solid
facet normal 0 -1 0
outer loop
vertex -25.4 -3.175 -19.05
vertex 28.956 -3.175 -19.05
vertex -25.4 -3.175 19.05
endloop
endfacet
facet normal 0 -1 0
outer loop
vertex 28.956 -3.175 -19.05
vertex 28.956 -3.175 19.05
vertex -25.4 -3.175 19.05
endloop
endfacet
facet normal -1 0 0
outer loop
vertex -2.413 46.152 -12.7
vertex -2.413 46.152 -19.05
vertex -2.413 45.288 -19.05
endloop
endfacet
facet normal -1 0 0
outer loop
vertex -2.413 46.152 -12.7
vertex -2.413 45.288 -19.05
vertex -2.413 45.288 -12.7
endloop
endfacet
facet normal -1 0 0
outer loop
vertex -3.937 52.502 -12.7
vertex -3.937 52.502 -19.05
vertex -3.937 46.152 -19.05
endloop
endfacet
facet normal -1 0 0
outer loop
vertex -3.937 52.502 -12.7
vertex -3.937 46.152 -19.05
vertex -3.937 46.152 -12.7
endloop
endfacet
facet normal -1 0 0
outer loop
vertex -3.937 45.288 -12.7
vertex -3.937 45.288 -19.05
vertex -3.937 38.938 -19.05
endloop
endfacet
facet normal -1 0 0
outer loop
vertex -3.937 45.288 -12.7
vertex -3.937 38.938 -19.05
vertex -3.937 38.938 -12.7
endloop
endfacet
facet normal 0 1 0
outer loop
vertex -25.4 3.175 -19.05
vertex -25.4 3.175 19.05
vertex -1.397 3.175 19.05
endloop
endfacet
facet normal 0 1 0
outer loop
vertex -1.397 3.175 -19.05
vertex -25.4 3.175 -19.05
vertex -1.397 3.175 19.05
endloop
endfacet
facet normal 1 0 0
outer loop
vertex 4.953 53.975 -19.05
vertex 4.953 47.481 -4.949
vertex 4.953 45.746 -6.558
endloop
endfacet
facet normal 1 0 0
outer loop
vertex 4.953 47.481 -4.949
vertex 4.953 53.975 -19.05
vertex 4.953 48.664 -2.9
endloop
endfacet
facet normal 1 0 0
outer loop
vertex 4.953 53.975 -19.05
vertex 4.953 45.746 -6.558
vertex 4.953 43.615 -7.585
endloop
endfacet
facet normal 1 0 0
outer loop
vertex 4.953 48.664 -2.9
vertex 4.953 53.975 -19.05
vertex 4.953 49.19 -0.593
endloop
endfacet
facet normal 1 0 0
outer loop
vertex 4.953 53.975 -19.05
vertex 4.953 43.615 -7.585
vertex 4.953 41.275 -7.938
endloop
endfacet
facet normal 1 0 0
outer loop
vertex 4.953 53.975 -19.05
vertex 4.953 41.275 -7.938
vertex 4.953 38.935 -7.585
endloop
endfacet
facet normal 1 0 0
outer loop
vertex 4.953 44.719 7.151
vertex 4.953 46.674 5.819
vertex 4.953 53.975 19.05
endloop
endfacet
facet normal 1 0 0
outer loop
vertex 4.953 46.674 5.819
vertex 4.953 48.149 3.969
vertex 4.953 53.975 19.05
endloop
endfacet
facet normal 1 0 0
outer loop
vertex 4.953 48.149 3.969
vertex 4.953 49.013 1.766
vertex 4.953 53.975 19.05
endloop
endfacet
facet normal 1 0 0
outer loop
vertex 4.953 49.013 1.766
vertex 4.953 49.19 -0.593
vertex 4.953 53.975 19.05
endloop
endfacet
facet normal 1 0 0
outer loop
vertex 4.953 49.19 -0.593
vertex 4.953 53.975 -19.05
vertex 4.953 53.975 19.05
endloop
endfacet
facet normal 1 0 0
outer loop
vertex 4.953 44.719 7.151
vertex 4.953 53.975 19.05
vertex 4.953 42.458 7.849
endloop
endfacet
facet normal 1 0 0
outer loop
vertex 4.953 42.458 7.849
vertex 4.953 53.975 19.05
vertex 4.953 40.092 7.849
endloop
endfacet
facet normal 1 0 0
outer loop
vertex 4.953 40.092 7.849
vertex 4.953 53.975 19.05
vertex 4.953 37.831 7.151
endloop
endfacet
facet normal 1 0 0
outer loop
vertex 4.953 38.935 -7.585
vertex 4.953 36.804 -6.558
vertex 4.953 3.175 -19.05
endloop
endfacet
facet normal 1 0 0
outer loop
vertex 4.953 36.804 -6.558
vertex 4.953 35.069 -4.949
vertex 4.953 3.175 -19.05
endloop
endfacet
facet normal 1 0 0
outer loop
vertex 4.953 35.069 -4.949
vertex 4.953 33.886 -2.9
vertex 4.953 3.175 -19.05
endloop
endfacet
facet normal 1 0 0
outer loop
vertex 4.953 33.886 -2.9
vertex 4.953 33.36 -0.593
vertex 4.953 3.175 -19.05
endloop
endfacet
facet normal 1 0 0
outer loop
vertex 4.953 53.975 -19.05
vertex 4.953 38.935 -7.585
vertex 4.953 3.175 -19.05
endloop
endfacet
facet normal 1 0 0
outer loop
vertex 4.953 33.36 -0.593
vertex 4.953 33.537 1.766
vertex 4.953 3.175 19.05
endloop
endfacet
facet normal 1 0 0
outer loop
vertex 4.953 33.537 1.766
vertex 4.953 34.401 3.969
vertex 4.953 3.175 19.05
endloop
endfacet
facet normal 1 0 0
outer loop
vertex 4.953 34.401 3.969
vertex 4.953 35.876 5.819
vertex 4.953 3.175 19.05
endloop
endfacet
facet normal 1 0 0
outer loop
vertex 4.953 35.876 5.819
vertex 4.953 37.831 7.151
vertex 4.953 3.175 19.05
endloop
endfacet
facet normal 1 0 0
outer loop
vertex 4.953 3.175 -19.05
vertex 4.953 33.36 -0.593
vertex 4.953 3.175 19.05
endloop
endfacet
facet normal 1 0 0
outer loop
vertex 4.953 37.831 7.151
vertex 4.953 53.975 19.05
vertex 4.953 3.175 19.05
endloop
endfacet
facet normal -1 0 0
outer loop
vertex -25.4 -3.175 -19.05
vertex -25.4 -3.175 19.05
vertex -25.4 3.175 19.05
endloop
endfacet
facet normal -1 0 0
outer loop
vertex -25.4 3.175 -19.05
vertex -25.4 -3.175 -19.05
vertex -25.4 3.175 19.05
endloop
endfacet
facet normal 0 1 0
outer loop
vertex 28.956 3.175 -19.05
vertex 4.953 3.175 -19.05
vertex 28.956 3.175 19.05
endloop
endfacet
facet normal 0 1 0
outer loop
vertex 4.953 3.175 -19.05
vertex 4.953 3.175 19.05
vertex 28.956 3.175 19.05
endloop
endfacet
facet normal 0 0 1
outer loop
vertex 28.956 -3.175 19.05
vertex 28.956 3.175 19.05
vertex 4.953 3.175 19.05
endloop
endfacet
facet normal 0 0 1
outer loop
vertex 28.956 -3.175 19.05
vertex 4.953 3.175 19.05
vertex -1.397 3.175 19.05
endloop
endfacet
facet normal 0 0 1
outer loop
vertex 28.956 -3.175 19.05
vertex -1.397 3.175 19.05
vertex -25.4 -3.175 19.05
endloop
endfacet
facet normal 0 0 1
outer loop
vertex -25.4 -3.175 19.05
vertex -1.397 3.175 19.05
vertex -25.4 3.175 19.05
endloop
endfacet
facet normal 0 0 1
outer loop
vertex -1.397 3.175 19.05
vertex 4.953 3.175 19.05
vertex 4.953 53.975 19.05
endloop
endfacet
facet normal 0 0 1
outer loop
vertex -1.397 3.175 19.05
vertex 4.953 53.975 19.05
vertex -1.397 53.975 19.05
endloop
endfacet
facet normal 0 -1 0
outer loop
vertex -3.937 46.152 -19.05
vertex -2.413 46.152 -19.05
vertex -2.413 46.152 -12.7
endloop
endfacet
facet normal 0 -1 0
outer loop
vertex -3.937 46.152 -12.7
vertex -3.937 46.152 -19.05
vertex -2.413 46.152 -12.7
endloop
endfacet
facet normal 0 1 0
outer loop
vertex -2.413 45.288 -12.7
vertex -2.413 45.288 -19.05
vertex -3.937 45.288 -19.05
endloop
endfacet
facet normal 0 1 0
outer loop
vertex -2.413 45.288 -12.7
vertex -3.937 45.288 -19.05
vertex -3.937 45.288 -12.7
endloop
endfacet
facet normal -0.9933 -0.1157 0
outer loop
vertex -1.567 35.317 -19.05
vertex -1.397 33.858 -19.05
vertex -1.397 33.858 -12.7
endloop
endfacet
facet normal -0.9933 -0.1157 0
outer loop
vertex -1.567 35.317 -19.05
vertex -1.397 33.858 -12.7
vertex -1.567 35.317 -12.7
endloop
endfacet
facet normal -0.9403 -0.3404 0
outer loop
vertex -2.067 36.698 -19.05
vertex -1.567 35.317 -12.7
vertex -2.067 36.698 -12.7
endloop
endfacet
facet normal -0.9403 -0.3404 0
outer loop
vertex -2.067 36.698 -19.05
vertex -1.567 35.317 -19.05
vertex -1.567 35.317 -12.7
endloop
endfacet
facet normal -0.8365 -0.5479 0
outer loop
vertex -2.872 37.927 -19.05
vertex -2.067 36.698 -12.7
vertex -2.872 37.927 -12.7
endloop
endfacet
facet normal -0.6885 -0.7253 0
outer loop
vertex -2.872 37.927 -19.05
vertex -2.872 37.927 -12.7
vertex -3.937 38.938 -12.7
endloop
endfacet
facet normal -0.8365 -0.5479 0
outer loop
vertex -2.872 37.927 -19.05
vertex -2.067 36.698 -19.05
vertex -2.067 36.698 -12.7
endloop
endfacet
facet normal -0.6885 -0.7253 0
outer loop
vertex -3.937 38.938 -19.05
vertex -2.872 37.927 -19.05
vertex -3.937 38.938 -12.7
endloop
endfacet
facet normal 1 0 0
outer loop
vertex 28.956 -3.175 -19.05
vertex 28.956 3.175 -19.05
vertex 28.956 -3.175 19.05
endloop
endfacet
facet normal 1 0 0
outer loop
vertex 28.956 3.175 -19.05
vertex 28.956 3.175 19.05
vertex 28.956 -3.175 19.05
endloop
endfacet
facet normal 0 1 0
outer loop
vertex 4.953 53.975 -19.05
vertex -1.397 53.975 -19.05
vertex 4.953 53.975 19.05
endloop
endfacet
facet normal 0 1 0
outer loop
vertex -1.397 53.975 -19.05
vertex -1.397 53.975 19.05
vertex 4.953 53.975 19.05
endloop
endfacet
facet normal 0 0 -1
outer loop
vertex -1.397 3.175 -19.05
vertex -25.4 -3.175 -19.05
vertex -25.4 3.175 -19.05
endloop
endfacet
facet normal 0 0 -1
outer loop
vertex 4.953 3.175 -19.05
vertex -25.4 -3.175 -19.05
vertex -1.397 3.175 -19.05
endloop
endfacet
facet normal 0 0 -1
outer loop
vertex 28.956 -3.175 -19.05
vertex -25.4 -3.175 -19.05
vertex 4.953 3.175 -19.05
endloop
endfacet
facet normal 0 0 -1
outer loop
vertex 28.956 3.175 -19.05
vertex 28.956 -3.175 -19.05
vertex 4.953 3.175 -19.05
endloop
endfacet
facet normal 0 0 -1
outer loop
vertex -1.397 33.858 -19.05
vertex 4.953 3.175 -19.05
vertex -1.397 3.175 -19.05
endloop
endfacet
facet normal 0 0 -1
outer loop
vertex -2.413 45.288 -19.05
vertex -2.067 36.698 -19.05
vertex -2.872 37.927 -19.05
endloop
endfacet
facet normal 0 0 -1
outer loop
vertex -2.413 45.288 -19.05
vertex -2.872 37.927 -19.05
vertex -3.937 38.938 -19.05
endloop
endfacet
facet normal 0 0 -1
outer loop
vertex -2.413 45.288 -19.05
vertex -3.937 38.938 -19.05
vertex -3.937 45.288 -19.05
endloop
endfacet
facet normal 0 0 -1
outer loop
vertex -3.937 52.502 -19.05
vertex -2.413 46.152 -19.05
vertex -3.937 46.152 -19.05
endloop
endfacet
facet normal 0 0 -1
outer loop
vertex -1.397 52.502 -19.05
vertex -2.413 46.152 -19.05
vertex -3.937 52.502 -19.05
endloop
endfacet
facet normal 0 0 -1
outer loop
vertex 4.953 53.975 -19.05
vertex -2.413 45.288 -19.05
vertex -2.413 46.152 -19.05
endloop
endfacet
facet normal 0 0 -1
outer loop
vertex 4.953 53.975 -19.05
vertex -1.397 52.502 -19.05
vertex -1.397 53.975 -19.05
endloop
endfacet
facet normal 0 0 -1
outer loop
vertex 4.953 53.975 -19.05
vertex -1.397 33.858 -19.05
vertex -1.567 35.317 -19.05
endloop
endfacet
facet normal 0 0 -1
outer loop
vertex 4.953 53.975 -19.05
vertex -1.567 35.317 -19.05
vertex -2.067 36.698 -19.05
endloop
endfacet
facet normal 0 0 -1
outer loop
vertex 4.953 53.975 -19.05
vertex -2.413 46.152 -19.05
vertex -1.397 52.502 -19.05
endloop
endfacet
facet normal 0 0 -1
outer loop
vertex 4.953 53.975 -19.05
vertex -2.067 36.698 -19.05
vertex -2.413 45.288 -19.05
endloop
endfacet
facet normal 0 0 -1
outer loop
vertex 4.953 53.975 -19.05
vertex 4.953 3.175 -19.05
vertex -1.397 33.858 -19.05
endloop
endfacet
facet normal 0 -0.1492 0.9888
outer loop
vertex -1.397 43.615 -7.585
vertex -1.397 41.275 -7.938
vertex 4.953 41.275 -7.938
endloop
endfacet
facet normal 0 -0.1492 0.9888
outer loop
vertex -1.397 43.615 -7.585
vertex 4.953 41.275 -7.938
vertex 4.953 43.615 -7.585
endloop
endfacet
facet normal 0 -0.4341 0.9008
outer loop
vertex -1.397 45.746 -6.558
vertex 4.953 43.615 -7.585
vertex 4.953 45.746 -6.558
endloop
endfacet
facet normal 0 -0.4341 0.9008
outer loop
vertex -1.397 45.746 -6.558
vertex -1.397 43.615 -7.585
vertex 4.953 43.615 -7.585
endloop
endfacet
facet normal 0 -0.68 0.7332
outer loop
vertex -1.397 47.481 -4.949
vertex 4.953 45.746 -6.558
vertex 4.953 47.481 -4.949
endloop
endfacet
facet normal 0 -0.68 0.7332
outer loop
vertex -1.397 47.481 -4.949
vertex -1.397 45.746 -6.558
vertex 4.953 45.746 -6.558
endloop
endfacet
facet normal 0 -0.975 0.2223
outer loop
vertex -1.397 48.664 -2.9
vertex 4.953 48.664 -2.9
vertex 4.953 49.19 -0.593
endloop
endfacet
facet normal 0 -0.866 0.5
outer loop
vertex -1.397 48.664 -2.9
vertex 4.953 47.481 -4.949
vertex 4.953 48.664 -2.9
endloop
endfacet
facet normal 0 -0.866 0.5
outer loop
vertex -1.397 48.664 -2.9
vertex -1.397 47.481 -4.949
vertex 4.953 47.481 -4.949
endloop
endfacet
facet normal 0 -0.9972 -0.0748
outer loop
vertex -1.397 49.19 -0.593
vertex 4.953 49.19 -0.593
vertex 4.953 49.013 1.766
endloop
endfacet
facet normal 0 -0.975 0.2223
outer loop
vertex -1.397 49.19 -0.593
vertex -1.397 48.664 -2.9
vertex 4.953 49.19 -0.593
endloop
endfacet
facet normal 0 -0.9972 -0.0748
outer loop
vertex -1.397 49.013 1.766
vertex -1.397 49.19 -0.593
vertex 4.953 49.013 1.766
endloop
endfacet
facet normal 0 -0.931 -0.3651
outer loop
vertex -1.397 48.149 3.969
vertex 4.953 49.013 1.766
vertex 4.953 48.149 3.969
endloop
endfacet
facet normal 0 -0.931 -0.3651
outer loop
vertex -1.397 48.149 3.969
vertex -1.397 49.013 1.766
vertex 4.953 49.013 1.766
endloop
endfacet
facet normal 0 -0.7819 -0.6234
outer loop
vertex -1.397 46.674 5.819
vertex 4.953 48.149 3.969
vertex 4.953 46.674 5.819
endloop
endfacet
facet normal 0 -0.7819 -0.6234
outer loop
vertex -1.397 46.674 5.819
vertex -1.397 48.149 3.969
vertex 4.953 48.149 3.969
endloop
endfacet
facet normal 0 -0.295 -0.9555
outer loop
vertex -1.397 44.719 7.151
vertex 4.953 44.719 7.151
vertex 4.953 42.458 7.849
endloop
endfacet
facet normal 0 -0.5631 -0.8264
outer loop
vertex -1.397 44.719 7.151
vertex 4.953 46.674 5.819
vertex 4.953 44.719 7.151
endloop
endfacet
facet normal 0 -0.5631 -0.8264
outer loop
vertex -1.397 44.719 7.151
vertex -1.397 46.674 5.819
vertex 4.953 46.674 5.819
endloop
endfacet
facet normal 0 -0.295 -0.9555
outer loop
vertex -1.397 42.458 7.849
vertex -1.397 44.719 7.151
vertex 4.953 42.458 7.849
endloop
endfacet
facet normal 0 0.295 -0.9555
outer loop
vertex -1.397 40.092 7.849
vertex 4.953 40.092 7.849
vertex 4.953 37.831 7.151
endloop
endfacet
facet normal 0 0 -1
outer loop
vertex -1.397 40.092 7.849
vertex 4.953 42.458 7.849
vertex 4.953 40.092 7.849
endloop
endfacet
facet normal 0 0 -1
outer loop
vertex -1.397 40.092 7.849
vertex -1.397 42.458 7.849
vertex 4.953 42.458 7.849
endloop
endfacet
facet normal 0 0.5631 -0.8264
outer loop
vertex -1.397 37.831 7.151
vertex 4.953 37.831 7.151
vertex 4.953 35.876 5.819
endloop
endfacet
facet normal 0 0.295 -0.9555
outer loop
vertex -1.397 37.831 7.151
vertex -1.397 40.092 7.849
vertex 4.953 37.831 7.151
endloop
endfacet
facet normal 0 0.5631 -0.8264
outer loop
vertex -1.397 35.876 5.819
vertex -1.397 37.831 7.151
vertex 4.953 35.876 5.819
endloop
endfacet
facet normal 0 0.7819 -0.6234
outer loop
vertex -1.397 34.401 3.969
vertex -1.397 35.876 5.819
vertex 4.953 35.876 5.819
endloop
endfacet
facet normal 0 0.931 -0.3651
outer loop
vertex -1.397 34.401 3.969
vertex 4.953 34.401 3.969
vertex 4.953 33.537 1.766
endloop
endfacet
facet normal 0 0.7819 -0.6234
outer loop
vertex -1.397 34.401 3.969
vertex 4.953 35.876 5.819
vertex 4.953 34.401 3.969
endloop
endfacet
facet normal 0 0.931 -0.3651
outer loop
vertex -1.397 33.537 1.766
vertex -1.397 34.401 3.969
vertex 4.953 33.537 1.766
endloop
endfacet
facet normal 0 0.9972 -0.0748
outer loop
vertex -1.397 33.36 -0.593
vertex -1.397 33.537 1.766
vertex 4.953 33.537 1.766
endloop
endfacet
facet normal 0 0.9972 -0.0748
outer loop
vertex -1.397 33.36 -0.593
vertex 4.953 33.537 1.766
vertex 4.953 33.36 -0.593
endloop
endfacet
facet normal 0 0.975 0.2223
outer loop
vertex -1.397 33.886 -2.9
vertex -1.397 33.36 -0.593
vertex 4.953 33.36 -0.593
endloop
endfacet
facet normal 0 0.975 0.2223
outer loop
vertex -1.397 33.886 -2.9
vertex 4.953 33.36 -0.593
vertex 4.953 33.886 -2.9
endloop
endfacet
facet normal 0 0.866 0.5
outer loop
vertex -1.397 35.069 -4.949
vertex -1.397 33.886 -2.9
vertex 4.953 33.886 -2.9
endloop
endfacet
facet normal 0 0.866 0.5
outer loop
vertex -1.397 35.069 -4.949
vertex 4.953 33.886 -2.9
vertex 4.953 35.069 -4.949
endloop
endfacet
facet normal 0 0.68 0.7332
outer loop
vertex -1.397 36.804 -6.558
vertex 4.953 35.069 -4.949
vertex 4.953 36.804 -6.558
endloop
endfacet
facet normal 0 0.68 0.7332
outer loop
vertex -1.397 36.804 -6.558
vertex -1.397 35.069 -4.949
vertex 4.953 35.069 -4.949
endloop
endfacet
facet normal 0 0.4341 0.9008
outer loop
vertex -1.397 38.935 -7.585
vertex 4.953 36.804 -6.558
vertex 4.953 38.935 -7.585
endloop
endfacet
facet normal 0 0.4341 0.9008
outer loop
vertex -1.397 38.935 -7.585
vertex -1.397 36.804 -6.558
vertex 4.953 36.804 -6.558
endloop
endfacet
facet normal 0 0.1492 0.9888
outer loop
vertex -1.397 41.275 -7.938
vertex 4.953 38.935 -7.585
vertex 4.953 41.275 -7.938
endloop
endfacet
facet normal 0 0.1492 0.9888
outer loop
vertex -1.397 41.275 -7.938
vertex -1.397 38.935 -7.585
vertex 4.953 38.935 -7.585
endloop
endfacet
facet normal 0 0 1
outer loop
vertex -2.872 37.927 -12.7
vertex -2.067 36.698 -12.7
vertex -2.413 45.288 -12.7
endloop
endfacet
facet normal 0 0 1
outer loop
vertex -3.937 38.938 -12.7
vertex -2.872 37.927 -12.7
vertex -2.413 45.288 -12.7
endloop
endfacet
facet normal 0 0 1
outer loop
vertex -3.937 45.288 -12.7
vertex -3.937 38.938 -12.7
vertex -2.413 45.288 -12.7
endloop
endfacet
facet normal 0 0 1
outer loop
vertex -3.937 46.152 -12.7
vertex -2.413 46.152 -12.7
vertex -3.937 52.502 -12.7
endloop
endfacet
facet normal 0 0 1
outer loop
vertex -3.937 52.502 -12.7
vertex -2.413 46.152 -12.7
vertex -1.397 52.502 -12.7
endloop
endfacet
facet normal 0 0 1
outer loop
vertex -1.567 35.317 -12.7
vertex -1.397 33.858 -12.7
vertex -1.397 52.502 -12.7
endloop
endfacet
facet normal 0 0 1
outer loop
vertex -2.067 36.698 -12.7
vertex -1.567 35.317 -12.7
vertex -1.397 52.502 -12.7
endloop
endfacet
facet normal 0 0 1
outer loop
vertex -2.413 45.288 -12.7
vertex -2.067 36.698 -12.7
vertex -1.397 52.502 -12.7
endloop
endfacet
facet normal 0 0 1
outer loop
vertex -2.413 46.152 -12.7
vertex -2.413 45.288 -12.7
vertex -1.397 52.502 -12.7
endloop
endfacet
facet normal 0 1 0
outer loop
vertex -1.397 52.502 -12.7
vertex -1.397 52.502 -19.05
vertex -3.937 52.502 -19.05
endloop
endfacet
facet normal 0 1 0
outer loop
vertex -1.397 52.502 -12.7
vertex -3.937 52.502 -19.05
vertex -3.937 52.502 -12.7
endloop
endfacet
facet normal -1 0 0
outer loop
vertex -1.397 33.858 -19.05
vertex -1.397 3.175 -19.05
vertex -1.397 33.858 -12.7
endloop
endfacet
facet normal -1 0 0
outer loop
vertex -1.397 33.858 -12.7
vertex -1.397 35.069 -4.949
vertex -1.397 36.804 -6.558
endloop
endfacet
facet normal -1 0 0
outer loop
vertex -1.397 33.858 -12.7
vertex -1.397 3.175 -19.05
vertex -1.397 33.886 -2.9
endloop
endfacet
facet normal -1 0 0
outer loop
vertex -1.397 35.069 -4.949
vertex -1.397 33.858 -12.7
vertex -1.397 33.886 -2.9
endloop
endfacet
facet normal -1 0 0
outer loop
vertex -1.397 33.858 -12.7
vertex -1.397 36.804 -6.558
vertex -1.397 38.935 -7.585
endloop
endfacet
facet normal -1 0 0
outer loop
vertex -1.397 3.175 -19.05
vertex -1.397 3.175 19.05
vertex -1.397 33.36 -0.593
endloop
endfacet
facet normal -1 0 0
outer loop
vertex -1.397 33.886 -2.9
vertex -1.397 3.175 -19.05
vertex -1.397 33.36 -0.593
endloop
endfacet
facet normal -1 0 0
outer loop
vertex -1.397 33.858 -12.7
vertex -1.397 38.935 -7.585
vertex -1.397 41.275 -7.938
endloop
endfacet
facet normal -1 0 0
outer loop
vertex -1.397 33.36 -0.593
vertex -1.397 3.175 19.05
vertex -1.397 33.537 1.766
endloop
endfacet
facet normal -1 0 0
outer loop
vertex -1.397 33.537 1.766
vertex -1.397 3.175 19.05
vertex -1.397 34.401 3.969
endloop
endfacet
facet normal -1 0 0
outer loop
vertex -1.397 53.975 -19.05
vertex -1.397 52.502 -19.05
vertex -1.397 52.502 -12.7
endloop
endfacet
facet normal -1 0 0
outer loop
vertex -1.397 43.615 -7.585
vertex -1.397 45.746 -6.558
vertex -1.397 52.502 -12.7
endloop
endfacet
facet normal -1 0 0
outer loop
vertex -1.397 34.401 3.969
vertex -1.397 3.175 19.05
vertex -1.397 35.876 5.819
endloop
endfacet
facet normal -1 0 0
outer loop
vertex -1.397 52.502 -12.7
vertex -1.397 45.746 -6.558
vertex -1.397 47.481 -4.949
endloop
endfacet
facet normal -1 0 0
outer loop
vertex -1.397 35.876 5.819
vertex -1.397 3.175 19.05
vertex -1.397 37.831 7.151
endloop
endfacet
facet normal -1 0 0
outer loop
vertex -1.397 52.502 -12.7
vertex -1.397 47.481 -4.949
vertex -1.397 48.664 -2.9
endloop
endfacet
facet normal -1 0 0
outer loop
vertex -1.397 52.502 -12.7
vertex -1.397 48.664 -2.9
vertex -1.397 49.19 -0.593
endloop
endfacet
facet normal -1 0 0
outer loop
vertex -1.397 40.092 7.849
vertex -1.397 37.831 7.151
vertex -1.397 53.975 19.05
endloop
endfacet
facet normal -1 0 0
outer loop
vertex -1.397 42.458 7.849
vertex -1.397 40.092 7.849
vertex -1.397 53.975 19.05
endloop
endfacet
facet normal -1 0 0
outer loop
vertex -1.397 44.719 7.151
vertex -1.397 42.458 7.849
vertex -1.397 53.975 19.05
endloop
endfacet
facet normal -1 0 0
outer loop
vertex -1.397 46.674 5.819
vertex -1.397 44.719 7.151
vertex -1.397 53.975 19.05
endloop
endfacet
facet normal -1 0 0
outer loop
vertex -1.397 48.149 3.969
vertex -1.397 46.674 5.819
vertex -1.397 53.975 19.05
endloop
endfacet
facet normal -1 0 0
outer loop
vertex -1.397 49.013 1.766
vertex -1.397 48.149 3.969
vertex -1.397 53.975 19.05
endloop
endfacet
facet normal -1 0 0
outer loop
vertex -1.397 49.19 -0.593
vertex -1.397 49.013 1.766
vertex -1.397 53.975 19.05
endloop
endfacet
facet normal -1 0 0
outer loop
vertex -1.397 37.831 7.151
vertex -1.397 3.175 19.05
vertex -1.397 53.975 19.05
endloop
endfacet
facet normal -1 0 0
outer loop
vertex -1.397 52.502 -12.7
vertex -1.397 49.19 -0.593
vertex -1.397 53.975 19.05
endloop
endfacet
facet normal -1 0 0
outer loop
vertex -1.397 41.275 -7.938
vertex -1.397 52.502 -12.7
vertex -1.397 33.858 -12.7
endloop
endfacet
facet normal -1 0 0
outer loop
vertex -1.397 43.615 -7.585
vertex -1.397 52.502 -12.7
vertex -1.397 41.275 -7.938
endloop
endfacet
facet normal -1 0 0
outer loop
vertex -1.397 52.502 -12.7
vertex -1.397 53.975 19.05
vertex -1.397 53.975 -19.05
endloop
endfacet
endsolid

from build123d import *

# Parameters (mm, degrees)
BOSS_EXTRUDE1_DEPTH     = 19.05
CUT_EXTRUDE1_DEPTH      = 65.788175881
CUT_EXTRUDE1_DEPTH_BACK = 65.788175881
SKETCH2_R               = 7.9375
SKETCH3_W               = 6.35
SKETCH3_H               = 6.35
BOSS_EXTRUDE2_DEPTH     = 2.54
FILLET1_R               = 6.35
SKETCH4_W               = 6.35
SKETCH4_H               = 0.8636
BOSS_EXTRUDE3_DEPTH     = 1.016


with BuildPart() as part:
    # Sketch1 → Boss-Extrude1 (new, symmetric)
    with BuildSketch(Plane.XY):
        Polygon((-1.397, 3.175), (-1.397, 53.975), (4.953, 53.975), (4.953, 3.175), (28.956, 3.175), (28.956, -3.175), (-25.4, -3.175), (-25.4, 3.175), align=None)
    extrude(amount=BOSS_EXTRUDE1_DEPTH, both=True)

    # Sketch2 → Cut-Extrude1 (cut, two sides: drawn at the far end of the back side and taken through both)
    with BuildSketch(Plane(origin=(4.953, 0, 0), x_dir=(0, 0, -1), z_dir=(1, 0, 0)).offset(-CUT_EXTRUDE1_DEPTH_BACK)):
        with Locations((0, 41.275)):
            Circle(SKETCH2_R)
    extrude(amount=CUT_EXTRUDE1_DEPTH + CUT_EXTRUDE1_DEPTH_BACK, mode=Mode.SUBTRACT)

    # Sketch3 → Boss-Extrude2 (add)
    with BuildSketch(Plane.ZY.offset(1.397)):
        with Locations((-15.875, 49.3268)):
            Rectangle(SKETCH3_W, SKETCH3_H)
        with Locations((-15.875, 42.1132)):
            Rectangle(SKETCH3_W, SKETCH3_H)
    extrude(amount=BOSS_EXTRUDE2_DEPTH)

    # Fillet1
    # the kernel refuses this fillet: 6.35 mm, written as the material it adds along each edge
    with BuildSketch(Plane(origin=(-1.397, 38.9382, -19.05), x_dir=(0, -1, 0), z_dir=(0, 0, 1))) as fillet1_piece_1:
        with BuildLine():
            CenterArc((5.08, -6.35), FILLET1_R, 90, 53.130102354)
            Line((0, -2.54), (-0.1016, -2.4638))
            ThreePointArc((-0.1016, -2.4638), (-0.127, -1.27), (-0.127, 0))
            Line((-0.127, 0), (0, 0.127))
            Line((0, 0.127), (5.08, 0.127))
            Line((5.08, 0.127), (5.08, 0))
        make_face()
    extrude(amount=6.35)

    # Sketch4 → Boss-Extrude3 (add)
    with BuildSketch(Plane.ZY.offset(1.397)):
        with Locations((-15.875, 45.72)):
            Rectangle(SKETCH4_W, SKETCH4_H)
    extrude(amount=BOSS_EXTRUDE3_DEPTH)


solid = part.part
